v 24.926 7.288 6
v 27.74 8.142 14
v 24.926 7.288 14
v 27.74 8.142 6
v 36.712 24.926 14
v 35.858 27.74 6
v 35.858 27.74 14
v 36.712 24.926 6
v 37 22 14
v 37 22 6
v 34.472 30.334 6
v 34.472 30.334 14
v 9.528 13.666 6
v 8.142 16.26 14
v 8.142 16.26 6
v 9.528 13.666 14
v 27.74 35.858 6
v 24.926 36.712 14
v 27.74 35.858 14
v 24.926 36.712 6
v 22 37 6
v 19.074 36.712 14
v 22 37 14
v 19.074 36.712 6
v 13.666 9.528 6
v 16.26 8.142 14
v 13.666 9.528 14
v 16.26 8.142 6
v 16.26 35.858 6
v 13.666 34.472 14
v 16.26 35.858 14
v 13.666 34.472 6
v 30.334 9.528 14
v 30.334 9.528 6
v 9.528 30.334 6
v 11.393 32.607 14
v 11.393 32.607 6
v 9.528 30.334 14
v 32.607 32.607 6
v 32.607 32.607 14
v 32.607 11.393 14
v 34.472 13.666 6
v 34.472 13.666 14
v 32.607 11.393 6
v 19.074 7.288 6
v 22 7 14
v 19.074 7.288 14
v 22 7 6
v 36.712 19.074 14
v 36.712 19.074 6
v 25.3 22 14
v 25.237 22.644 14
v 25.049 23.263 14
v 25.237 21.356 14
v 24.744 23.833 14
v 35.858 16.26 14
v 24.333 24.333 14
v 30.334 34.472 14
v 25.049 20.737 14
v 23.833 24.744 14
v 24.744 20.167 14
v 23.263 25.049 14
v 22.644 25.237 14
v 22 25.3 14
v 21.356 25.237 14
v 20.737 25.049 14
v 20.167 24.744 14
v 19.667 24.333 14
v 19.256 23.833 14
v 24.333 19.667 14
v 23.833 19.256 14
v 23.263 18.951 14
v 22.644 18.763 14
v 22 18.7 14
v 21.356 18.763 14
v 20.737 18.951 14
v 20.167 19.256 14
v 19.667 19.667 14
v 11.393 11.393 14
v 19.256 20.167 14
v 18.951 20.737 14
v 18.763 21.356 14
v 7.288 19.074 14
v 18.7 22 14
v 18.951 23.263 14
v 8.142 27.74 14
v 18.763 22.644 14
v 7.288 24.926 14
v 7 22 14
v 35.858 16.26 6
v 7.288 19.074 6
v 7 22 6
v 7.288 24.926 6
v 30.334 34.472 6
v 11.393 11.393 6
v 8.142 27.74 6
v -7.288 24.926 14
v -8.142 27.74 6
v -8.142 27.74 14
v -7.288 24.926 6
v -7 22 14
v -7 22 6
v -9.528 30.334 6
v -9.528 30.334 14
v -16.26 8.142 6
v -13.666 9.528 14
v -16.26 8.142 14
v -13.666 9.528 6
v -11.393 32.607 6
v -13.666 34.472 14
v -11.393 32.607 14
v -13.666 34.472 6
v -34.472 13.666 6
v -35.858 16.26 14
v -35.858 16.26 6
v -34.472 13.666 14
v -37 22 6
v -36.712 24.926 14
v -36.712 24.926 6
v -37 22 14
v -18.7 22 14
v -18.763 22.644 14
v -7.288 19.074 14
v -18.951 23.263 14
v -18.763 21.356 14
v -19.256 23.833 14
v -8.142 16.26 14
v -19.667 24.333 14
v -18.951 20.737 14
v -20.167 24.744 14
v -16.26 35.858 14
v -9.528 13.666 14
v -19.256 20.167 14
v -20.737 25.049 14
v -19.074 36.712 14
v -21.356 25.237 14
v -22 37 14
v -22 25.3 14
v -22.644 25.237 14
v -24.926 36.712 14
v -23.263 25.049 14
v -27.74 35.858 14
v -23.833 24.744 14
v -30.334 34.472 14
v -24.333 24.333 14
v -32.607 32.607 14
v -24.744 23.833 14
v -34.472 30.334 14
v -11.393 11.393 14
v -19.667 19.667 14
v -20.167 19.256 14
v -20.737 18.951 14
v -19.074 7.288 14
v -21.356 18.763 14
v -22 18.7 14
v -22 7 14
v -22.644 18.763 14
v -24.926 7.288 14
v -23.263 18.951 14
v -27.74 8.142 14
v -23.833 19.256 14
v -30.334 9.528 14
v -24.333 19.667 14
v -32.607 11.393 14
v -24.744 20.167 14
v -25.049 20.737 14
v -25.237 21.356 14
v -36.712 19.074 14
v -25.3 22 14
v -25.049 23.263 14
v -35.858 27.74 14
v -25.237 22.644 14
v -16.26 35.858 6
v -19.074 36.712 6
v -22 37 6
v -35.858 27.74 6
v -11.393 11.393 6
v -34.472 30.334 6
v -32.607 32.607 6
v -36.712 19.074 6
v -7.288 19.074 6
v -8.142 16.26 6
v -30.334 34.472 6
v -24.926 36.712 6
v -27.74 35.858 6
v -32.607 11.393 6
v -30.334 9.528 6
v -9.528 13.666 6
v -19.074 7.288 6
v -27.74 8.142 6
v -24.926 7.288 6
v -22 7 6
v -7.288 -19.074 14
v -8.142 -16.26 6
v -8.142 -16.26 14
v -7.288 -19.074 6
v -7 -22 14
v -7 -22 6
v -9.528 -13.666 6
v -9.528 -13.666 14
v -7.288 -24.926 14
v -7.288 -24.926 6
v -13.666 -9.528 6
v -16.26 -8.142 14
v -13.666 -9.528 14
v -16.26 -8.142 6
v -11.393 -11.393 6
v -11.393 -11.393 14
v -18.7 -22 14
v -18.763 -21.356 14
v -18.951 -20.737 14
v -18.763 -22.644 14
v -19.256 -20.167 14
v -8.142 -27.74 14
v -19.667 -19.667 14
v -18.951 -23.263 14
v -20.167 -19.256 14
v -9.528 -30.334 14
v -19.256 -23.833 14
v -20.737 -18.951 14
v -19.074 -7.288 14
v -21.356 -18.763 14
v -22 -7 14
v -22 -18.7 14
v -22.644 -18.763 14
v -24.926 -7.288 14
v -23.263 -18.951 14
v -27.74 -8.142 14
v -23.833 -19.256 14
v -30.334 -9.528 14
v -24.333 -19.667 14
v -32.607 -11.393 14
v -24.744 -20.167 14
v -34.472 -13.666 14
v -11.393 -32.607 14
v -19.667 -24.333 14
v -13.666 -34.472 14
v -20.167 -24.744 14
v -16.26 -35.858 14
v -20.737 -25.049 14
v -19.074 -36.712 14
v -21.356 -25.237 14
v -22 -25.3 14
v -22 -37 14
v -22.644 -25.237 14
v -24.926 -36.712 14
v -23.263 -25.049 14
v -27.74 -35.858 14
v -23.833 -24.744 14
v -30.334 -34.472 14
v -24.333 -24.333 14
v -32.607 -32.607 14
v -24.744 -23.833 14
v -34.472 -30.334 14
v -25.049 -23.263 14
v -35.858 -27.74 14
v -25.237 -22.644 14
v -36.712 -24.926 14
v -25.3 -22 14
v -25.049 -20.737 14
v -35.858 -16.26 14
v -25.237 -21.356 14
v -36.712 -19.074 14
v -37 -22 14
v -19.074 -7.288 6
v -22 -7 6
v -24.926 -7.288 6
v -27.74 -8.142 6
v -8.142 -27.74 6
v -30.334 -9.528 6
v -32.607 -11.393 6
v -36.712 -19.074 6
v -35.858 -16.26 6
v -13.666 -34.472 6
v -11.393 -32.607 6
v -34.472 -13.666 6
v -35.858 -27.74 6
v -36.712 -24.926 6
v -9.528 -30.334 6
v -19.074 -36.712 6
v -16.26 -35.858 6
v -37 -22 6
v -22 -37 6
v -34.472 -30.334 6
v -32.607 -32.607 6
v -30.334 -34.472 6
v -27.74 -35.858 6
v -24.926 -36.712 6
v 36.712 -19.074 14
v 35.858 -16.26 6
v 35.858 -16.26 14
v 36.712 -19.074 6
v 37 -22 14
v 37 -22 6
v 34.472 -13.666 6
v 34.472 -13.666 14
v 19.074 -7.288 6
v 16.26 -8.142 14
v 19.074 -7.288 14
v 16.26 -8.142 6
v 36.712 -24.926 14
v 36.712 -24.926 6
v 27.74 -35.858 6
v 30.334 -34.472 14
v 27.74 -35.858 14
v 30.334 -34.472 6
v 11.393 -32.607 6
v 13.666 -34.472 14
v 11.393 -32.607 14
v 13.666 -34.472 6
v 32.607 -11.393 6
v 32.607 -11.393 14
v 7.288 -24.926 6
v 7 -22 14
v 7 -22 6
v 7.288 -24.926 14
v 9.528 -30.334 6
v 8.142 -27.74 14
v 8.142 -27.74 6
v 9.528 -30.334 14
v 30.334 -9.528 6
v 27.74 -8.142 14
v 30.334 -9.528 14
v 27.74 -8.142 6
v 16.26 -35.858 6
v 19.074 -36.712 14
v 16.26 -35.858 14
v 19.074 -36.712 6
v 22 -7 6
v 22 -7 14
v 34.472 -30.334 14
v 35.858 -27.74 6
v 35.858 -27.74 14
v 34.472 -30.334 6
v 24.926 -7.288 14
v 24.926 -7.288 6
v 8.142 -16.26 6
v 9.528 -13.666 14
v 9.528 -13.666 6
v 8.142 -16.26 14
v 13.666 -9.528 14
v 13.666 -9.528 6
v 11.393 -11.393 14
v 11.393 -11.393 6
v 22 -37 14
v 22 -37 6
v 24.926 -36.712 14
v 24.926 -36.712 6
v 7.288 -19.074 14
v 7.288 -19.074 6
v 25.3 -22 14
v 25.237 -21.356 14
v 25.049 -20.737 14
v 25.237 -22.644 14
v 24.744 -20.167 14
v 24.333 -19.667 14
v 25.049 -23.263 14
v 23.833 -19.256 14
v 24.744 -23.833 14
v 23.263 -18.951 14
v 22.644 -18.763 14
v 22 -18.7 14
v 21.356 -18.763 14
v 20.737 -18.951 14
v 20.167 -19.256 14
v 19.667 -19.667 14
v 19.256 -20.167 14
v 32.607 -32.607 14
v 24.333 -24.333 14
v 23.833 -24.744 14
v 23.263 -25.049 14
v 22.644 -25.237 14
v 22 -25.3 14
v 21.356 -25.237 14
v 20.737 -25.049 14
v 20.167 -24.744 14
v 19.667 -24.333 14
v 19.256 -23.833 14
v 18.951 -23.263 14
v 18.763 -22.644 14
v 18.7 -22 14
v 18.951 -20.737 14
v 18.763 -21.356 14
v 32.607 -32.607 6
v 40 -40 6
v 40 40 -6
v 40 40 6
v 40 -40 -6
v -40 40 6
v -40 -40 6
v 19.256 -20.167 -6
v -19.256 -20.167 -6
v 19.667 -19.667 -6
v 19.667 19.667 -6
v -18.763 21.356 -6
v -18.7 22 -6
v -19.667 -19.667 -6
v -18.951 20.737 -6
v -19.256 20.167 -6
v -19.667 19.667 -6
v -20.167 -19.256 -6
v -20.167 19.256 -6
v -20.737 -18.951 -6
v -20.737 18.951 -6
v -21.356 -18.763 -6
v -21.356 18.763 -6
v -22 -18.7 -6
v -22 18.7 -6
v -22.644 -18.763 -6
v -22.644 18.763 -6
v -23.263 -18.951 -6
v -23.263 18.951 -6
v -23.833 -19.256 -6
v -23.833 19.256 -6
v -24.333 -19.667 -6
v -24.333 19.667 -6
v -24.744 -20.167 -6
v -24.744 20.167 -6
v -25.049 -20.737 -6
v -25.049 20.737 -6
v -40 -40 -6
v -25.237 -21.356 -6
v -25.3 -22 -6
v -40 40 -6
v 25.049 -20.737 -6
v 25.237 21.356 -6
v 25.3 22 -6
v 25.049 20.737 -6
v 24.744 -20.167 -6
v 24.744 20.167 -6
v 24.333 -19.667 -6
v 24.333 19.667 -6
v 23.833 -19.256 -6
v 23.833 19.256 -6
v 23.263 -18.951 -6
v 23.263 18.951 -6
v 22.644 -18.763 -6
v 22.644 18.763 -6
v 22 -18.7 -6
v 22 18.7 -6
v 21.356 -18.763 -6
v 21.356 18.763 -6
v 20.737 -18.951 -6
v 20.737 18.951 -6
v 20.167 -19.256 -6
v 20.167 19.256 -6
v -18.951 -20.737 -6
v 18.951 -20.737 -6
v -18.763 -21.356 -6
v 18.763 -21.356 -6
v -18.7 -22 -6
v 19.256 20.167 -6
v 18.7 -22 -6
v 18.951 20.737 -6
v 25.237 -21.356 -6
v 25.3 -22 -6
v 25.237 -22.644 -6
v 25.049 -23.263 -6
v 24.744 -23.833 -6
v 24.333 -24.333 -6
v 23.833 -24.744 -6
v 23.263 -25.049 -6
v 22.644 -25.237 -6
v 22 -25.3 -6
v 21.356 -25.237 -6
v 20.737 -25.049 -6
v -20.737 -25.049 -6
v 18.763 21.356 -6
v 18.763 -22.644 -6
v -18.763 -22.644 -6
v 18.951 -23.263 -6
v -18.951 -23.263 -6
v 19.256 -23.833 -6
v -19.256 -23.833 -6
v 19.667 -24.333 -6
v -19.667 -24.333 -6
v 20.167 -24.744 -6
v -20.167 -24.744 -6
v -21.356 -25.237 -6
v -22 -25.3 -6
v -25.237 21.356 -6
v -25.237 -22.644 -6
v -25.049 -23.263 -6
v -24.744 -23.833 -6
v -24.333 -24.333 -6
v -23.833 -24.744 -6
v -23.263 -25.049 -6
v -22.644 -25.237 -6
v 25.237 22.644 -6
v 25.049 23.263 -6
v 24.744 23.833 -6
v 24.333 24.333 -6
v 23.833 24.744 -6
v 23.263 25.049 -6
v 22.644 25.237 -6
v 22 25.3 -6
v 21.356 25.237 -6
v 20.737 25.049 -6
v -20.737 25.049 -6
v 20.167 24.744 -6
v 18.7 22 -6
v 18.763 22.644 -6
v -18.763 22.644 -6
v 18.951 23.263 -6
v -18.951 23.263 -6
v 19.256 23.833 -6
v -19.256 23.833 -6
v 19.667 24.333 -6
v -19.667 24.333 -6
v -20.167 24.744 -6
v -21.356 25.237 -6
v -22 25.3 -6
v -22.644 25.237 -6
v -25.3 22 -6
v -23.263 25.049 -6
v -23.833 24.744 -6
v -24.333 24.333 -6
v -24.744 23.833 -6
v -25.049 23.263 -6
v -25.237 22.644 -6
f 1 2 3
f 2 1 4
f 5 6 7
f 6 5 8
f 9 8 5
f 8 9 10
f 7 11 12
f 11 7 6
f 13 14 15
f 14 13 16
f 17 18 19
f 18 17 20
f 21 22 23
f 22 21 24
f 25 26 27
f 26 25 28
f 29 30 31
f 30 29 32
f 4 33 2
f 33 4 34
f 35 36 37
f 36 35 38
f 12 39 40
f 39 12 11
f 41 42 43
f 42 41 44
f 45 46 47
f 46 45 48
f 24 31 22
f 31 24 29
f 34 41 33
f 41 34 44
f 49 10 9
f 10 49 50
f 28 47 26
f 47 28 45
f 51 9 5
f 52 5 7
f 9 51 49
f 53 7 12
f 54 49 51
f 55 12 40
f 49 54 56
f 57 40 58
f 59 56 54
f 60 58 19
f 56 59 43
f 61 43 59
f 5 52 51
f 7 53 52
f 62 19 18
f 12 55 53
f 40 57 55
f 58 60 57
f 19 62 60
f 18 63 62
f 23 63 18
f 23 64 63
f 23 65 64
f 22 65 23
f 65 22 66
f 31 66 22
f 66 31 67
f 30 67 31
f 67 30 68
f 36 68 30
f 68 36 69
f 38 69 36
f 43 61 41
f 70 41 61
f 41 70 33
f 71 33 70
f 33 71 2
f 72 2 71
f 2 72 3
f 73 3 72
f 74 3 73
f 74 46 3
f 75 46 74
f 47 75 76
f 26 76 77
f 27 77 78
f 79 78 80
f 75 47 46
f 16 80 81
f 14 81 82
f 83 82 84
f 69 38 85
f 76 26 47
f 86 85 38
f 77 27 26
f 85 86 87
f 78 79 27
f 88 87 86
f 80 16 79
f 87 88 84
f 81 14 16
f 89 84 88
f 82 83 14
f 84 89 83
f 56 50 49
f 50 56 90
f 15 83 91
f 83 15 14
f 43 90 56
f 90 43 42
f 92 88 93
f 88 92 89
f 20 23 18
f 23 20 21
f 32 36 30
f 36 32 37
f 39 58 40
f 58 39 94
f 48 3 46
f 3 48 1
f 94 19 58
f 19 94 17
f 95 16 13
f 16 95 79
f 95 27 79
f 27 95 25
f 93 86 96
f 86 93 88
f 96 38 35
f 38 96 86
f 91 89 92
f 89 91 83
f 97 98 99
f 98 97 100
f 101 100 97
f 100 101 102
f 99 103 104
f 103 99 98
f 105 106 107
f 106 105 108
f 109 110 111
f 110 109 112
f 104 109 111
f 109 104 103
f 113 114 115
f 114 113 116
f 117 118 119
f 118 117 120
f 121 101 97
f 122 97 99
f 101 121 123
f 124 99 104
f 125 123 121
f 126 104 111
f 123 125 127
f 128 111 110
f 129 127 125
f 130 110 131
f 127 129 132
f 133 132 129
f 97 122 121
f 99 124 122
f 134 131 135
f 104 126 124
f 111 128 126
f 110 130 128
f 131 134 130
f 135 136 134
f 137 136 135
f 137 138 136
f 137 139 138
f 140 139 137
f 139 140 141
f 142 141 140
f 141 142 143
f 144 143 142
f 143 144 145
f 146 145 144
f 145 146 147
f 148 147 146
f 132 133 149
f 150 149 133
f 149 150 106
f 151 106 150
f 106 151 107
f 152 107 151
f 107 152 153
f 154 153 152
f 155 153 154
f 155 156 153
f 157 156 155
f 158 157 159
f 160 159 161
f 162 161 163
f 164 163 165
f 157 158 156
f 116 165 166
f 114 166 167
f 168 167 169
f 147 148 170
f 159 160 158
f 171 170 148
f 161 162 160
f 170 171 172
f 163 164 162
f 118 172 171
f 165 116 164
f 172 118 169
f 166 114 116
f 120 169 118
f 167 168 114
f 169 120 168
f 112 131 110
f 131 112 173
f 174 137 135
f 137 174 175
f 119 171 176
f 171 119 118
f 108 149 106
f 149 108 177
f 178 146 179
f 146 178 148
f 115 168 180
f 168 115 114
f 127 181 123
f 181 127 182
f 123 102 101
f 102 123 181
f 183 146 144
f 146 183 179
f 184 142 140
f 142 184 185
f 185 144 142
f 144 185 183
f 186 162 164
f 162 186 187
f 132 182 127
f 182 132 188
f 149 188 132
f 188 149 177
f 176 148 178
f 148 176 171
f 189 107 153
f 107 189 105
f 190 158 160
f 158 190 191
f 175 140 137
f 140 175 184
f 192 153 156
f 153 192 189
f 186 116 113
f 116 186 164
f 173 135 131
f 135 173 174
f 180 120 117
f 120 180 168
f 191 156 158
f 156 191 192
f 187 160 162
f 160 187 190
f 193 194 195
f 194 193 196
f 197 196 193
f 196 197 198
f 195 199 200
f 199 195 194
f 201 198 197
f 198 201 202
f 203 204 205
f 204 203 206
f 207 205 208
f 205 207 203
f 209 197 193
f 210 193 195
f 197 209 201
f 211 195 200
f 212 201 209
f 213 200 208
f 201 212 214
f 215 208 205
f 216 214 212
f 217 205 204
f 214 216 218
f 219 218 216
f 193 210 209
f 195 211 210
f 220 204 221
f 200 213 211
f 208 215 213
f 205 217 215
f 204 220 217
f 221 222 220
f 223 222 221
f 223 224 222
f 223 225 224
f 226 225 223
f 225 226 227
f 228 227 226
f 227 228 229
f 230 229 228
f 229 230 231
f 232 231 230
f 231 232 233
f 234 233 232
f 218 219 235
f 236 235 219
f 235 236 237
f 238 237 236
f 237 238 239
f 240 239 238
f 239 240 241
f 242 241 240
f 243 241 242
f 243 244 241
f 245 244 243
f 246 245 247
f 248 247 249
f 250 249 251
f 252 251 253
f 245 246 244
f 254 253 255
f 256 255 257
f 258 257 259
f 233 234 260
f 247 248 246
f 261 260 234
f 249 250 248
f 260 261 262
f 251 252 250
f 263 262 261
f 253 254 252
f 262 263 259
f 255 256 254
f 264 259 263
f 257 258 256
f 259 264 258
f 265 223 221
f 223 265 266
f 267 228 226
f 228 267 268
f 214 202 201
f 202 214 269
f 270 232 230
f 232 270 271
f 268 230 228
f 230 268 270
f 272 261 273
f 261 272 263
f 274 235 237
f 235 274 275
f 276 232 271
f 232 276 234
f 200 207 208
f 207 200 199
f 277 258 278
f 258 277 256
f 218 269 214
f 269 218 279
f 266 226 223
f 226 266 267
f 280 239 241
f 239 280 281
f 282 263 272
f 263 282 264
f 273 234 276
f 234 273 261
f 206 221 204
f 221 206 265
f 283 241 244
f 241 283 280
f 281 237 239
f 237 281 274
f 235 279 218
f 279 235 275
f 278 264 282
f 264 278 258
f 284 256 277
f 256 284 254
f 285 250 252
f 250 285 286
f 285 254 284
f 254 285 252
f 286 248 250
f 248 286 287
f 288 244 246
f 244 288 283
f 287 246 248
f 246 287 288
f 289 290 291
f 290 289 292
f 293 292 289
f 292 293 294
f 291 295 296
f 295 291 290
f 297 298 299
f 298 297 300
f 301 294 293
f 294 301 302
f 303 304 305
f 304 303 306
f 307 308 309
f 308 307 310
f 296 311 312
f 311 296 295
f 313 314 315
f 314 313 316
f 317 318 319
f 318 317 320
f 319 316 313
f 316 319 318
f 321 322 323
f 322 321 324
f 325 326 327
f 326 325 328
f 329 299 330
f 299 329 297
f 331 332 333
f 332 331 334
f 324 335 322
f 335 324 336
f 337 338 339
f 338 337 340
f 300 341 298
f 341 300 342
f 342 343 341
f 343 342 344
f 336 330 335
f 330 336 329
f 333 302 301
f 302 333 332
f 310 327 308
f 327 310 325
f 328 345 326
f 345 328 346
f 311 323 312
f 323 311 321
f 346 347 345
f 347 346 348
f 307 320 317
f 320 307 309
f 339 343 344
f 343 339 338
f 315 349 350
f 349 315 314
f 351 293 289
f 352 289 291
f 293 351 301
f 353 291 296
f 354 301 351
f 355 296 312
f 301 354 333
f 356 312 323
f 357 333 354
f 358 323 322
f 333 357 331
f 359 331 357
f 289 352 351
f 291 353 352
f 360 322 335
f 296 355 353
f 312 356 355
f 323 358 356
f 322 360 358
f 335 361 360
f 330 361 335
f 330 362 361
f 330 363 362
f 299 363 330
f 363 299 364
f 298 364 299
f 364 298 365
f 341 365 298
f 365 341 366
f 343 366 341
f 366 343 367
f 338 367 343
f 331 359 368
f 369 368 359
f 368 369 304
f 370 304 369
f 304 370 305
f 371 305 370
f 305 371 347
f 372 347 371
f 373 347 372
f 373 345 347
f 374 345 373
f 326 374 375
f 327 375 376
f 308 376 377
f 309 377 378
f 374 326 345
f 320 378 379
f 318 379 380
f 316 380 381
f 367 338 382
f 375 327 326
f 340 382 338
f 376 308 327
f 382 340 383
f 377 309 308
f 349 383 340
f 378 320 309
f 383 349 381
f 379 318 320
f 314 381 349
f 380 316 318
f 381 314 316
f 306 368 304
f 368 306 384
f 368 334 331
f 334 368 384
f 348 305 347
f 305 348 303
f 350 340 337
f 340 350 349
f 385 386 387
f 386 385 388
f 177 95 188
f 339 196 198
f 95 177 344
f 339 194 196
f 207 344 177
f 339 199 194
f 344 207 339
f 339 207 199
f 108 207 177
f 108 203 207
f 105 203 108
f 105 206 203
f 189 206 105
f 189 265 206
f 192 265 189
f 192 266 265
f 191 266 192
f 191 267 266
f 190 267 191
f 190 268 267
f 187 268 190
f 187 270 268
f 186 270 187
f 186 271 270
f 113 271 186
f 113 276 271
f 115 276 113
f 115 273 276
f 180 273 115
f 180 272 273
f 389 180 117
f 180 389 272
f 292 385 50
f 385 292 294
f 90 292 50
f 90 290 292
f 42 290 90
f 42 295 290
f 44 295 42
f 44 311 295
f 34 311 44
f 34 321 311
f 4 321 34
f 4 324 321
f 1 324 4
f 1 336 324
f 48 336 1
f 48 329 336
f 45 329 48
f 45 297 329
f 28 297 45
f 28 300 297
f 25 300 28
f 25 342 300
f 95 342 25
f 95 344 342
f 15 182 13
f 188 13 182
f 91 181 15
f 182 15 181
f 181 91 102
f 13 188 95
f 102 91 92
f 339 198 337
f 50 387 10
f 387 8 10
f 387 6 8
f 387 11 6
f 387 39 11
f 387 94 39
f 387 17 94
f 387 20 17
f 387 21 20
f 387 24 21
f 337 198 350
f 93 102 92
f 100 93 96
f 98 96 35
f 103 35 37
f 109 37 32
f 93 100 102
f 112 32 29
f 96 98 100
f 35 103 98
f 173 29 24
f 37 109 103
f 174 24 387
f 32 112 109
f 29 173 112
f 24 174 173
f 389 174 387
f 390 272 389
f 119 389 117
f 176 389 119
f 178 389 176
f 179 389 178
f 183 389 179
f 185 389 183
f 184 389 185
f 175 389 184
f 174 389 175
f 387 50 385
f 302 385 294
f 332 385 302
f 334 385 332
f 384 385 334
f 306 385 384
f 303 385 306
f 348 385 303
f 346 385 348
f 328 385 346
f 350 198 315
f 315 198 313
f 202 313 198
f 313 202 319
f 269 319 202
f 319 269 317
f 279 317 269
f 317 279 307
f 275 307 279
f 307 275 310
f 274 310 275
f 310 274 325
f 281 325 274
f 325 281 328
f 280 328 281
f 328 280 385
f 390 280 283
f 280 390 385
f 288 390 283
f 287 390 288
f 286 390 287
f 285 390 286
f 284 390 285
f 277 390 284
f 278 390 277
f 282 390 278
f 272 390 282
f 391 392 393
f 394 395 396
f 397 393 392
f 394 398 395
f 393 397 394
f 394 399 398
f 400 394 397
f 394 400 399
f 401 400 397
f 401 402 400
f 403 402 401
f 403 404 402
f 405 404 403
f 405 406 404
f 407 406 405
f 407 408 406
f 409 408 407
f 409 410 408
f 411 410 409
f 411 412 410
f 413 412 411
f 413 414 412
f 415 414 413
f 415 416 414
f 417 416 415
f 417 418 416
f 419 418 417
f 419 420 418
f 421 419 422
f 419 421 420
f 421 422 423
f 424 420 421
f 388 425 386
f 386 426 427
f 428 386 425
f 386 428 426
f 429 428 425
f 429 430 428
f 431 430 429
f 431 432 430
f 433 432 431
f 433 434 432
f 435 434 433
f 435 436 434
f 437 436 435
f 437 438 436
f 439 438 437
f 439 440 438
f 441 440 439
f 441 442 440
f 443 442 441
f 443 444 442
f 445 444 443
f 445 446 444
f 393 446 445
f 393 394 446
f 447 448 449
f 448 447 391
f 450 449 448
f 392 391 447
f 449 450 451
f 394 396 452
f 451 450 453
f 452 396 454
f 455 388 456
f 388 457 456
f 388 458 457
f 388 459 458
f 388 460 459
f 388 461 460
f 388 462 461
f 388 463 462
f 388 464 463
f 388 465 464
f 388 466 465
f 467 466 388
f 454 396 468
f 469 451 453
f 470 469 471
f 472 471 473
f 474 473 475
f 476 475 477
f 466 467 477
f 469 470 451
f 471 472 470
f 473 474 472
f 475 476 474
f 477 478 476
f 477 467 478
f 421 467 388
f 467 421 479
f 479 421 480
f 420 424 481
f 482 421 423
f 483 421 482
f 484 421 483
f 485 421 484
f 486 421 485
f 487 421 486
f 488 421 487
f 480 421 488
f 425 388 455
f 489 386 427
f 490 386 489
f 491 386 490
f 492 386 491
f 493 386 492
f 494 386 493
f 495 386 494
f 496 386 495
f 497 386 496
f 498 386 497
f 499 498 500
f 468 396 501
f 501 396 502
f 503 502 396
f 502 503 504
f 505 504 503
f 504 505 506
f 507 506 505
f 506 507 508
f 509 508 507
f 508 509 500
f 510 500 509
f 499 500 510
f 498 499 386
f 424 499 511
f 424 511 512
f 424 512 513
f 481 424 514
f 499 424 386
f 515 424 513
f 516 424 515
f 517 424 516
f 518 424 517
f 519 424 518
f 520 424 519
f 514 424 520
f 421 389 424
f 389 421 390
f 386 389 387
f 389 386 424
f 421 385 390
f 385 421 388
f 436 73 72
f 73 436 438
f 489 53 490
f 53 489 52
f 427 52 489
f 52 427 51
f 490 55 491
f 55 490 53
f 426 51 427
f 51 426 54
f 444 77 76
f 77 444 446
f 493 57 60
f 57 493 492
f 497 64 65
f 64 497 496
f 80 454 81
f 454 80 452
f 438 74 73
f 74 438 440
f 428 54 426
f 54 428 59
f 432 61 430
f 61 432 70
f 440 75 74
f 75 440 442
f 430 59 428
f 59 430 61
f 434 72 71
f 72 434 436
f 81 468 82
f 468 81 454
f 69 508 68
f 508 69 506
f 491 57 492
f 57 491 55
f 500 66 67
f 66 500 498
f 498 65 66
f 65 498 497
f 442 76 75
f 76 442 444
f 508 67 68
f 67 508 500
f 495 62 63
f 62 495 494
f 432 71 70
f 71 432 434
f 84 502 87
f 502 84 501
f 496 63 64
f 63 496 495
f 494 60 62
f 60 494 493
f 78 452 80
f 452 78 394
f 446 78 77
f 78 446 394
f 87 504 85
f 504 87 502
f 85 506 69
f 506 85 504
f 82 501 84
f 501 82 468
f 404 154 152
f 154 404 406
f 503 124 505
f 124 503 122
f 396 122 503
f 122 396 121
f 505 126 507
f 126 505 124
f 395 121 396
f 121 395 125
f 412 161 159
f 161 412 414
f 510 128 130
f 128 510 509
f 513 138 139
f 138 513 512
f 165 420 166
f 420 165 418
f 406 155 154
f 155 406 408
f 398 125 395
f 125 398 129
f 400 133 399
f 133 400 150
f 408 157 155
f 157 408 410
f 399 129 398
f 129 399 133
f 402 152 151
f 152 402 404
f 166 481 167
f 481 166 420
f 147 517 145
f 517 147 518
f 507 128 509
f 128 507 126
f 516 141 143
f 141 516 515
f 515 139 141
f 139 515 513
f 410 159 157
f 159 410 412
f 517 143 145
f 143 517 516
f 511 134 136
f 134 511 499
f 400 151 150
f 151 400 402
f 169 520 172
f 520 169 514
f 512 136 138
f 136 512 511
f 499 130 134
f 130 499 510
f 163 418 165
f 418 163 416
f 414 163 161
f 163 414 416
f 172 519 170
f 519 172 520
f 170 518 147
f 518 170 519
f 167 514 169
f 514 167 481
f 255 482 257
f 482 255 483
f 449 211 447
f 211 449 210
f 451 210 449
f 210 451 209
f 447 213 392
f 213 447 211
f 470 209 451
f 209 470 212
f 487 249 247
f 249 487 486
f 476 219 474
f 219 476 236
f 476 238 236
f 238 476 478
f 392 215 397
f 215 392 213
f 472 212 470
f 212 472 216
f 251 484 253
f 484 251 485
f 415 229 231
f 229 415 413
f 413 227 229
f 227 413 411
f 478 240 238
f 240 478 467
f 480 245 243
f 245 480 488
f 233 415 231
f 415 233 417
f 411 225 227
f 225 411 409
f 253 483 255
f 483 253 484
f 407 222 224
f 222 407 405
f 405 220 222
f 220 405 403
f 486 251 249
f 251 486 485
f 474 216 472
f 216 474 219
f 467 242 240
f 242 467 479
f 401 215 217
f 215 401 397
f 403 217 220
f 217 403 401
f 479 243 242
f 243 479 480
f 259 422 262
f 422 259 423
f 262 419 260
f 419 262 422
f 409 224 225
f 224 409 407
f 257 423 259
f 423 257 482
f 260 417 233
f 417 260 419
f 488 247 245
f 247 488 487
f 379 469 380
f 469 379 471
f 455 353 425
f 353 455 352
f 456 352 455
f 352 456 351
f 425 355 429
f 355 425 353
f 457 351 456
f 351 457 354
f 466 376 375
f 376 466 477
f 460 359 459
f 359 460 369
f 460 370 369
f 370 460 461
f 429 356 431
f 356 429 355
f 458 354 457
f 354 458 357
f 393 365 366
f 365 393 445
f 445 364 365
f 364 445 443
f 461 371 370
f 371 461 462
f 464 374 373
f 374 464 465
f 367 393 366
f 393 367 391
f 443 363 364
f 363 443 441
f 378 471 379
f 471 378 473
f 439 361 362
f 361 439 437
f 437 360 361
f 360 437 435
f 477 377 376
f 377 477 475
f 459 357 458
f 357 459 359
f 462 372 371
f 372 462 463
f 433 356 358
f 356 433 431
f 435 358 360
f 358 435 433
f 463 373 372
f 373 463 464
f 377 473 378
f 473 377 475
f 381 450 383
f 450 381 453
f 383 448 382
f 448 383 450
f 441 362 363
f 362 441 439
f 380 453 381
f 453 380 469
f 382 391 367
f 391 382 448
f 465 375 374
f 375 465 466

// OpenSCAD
$fn = 32;

// ----------------------------------------------------------------------
// Anchor pads 80 x 80 x 20
// four corner bosses with anchor holes
// ----------------------------------------------------------------------

// --- parameters (mm) ---
plate = [80, 80, 12];  // base plate size (x, y, z)
pads = 4;              // boss count, one per corner
edge = 18;             // boss centre offset from the plate edge
boss_d = 30;           // boss diameter
boss_h = 8;            // boss height above the base plate
hole_d = 6.6;          // hole diameter

// --- derived feature positions (mm) ---
height = plate[2] + boss_h;      // = 20   overall height of the part
corner_x = plate[0] / 2 - edge;  // = 22   boss centre X
corner_y = plate[1] / 2 - edge;  // = 22   boss centre Y
feature_centers = [
  [corner_x, corner_y],
  [-corner_x, corner_y],
  [-corner_x, -corner_y],
  [corner_x, -corner_y]
];   // boss centres, anchor holes are drilled there

// base plate, four bosses standing on it, anchor holes all the way through
difference() {
  union() {
    cube(plate, center = true);
    for (centre = feature_centers)
      translate([centre[0], centre[1], plate[2] / 2 - 1])
        cylinder(d = boss_d, h = boss_h + 1);
  }
  for (centre = feature_centers)
    translate([centre[0], centre[1], -height])
      cylinder(d = hole_d, h = 2 * height + 2);  // through boss and plate
}
